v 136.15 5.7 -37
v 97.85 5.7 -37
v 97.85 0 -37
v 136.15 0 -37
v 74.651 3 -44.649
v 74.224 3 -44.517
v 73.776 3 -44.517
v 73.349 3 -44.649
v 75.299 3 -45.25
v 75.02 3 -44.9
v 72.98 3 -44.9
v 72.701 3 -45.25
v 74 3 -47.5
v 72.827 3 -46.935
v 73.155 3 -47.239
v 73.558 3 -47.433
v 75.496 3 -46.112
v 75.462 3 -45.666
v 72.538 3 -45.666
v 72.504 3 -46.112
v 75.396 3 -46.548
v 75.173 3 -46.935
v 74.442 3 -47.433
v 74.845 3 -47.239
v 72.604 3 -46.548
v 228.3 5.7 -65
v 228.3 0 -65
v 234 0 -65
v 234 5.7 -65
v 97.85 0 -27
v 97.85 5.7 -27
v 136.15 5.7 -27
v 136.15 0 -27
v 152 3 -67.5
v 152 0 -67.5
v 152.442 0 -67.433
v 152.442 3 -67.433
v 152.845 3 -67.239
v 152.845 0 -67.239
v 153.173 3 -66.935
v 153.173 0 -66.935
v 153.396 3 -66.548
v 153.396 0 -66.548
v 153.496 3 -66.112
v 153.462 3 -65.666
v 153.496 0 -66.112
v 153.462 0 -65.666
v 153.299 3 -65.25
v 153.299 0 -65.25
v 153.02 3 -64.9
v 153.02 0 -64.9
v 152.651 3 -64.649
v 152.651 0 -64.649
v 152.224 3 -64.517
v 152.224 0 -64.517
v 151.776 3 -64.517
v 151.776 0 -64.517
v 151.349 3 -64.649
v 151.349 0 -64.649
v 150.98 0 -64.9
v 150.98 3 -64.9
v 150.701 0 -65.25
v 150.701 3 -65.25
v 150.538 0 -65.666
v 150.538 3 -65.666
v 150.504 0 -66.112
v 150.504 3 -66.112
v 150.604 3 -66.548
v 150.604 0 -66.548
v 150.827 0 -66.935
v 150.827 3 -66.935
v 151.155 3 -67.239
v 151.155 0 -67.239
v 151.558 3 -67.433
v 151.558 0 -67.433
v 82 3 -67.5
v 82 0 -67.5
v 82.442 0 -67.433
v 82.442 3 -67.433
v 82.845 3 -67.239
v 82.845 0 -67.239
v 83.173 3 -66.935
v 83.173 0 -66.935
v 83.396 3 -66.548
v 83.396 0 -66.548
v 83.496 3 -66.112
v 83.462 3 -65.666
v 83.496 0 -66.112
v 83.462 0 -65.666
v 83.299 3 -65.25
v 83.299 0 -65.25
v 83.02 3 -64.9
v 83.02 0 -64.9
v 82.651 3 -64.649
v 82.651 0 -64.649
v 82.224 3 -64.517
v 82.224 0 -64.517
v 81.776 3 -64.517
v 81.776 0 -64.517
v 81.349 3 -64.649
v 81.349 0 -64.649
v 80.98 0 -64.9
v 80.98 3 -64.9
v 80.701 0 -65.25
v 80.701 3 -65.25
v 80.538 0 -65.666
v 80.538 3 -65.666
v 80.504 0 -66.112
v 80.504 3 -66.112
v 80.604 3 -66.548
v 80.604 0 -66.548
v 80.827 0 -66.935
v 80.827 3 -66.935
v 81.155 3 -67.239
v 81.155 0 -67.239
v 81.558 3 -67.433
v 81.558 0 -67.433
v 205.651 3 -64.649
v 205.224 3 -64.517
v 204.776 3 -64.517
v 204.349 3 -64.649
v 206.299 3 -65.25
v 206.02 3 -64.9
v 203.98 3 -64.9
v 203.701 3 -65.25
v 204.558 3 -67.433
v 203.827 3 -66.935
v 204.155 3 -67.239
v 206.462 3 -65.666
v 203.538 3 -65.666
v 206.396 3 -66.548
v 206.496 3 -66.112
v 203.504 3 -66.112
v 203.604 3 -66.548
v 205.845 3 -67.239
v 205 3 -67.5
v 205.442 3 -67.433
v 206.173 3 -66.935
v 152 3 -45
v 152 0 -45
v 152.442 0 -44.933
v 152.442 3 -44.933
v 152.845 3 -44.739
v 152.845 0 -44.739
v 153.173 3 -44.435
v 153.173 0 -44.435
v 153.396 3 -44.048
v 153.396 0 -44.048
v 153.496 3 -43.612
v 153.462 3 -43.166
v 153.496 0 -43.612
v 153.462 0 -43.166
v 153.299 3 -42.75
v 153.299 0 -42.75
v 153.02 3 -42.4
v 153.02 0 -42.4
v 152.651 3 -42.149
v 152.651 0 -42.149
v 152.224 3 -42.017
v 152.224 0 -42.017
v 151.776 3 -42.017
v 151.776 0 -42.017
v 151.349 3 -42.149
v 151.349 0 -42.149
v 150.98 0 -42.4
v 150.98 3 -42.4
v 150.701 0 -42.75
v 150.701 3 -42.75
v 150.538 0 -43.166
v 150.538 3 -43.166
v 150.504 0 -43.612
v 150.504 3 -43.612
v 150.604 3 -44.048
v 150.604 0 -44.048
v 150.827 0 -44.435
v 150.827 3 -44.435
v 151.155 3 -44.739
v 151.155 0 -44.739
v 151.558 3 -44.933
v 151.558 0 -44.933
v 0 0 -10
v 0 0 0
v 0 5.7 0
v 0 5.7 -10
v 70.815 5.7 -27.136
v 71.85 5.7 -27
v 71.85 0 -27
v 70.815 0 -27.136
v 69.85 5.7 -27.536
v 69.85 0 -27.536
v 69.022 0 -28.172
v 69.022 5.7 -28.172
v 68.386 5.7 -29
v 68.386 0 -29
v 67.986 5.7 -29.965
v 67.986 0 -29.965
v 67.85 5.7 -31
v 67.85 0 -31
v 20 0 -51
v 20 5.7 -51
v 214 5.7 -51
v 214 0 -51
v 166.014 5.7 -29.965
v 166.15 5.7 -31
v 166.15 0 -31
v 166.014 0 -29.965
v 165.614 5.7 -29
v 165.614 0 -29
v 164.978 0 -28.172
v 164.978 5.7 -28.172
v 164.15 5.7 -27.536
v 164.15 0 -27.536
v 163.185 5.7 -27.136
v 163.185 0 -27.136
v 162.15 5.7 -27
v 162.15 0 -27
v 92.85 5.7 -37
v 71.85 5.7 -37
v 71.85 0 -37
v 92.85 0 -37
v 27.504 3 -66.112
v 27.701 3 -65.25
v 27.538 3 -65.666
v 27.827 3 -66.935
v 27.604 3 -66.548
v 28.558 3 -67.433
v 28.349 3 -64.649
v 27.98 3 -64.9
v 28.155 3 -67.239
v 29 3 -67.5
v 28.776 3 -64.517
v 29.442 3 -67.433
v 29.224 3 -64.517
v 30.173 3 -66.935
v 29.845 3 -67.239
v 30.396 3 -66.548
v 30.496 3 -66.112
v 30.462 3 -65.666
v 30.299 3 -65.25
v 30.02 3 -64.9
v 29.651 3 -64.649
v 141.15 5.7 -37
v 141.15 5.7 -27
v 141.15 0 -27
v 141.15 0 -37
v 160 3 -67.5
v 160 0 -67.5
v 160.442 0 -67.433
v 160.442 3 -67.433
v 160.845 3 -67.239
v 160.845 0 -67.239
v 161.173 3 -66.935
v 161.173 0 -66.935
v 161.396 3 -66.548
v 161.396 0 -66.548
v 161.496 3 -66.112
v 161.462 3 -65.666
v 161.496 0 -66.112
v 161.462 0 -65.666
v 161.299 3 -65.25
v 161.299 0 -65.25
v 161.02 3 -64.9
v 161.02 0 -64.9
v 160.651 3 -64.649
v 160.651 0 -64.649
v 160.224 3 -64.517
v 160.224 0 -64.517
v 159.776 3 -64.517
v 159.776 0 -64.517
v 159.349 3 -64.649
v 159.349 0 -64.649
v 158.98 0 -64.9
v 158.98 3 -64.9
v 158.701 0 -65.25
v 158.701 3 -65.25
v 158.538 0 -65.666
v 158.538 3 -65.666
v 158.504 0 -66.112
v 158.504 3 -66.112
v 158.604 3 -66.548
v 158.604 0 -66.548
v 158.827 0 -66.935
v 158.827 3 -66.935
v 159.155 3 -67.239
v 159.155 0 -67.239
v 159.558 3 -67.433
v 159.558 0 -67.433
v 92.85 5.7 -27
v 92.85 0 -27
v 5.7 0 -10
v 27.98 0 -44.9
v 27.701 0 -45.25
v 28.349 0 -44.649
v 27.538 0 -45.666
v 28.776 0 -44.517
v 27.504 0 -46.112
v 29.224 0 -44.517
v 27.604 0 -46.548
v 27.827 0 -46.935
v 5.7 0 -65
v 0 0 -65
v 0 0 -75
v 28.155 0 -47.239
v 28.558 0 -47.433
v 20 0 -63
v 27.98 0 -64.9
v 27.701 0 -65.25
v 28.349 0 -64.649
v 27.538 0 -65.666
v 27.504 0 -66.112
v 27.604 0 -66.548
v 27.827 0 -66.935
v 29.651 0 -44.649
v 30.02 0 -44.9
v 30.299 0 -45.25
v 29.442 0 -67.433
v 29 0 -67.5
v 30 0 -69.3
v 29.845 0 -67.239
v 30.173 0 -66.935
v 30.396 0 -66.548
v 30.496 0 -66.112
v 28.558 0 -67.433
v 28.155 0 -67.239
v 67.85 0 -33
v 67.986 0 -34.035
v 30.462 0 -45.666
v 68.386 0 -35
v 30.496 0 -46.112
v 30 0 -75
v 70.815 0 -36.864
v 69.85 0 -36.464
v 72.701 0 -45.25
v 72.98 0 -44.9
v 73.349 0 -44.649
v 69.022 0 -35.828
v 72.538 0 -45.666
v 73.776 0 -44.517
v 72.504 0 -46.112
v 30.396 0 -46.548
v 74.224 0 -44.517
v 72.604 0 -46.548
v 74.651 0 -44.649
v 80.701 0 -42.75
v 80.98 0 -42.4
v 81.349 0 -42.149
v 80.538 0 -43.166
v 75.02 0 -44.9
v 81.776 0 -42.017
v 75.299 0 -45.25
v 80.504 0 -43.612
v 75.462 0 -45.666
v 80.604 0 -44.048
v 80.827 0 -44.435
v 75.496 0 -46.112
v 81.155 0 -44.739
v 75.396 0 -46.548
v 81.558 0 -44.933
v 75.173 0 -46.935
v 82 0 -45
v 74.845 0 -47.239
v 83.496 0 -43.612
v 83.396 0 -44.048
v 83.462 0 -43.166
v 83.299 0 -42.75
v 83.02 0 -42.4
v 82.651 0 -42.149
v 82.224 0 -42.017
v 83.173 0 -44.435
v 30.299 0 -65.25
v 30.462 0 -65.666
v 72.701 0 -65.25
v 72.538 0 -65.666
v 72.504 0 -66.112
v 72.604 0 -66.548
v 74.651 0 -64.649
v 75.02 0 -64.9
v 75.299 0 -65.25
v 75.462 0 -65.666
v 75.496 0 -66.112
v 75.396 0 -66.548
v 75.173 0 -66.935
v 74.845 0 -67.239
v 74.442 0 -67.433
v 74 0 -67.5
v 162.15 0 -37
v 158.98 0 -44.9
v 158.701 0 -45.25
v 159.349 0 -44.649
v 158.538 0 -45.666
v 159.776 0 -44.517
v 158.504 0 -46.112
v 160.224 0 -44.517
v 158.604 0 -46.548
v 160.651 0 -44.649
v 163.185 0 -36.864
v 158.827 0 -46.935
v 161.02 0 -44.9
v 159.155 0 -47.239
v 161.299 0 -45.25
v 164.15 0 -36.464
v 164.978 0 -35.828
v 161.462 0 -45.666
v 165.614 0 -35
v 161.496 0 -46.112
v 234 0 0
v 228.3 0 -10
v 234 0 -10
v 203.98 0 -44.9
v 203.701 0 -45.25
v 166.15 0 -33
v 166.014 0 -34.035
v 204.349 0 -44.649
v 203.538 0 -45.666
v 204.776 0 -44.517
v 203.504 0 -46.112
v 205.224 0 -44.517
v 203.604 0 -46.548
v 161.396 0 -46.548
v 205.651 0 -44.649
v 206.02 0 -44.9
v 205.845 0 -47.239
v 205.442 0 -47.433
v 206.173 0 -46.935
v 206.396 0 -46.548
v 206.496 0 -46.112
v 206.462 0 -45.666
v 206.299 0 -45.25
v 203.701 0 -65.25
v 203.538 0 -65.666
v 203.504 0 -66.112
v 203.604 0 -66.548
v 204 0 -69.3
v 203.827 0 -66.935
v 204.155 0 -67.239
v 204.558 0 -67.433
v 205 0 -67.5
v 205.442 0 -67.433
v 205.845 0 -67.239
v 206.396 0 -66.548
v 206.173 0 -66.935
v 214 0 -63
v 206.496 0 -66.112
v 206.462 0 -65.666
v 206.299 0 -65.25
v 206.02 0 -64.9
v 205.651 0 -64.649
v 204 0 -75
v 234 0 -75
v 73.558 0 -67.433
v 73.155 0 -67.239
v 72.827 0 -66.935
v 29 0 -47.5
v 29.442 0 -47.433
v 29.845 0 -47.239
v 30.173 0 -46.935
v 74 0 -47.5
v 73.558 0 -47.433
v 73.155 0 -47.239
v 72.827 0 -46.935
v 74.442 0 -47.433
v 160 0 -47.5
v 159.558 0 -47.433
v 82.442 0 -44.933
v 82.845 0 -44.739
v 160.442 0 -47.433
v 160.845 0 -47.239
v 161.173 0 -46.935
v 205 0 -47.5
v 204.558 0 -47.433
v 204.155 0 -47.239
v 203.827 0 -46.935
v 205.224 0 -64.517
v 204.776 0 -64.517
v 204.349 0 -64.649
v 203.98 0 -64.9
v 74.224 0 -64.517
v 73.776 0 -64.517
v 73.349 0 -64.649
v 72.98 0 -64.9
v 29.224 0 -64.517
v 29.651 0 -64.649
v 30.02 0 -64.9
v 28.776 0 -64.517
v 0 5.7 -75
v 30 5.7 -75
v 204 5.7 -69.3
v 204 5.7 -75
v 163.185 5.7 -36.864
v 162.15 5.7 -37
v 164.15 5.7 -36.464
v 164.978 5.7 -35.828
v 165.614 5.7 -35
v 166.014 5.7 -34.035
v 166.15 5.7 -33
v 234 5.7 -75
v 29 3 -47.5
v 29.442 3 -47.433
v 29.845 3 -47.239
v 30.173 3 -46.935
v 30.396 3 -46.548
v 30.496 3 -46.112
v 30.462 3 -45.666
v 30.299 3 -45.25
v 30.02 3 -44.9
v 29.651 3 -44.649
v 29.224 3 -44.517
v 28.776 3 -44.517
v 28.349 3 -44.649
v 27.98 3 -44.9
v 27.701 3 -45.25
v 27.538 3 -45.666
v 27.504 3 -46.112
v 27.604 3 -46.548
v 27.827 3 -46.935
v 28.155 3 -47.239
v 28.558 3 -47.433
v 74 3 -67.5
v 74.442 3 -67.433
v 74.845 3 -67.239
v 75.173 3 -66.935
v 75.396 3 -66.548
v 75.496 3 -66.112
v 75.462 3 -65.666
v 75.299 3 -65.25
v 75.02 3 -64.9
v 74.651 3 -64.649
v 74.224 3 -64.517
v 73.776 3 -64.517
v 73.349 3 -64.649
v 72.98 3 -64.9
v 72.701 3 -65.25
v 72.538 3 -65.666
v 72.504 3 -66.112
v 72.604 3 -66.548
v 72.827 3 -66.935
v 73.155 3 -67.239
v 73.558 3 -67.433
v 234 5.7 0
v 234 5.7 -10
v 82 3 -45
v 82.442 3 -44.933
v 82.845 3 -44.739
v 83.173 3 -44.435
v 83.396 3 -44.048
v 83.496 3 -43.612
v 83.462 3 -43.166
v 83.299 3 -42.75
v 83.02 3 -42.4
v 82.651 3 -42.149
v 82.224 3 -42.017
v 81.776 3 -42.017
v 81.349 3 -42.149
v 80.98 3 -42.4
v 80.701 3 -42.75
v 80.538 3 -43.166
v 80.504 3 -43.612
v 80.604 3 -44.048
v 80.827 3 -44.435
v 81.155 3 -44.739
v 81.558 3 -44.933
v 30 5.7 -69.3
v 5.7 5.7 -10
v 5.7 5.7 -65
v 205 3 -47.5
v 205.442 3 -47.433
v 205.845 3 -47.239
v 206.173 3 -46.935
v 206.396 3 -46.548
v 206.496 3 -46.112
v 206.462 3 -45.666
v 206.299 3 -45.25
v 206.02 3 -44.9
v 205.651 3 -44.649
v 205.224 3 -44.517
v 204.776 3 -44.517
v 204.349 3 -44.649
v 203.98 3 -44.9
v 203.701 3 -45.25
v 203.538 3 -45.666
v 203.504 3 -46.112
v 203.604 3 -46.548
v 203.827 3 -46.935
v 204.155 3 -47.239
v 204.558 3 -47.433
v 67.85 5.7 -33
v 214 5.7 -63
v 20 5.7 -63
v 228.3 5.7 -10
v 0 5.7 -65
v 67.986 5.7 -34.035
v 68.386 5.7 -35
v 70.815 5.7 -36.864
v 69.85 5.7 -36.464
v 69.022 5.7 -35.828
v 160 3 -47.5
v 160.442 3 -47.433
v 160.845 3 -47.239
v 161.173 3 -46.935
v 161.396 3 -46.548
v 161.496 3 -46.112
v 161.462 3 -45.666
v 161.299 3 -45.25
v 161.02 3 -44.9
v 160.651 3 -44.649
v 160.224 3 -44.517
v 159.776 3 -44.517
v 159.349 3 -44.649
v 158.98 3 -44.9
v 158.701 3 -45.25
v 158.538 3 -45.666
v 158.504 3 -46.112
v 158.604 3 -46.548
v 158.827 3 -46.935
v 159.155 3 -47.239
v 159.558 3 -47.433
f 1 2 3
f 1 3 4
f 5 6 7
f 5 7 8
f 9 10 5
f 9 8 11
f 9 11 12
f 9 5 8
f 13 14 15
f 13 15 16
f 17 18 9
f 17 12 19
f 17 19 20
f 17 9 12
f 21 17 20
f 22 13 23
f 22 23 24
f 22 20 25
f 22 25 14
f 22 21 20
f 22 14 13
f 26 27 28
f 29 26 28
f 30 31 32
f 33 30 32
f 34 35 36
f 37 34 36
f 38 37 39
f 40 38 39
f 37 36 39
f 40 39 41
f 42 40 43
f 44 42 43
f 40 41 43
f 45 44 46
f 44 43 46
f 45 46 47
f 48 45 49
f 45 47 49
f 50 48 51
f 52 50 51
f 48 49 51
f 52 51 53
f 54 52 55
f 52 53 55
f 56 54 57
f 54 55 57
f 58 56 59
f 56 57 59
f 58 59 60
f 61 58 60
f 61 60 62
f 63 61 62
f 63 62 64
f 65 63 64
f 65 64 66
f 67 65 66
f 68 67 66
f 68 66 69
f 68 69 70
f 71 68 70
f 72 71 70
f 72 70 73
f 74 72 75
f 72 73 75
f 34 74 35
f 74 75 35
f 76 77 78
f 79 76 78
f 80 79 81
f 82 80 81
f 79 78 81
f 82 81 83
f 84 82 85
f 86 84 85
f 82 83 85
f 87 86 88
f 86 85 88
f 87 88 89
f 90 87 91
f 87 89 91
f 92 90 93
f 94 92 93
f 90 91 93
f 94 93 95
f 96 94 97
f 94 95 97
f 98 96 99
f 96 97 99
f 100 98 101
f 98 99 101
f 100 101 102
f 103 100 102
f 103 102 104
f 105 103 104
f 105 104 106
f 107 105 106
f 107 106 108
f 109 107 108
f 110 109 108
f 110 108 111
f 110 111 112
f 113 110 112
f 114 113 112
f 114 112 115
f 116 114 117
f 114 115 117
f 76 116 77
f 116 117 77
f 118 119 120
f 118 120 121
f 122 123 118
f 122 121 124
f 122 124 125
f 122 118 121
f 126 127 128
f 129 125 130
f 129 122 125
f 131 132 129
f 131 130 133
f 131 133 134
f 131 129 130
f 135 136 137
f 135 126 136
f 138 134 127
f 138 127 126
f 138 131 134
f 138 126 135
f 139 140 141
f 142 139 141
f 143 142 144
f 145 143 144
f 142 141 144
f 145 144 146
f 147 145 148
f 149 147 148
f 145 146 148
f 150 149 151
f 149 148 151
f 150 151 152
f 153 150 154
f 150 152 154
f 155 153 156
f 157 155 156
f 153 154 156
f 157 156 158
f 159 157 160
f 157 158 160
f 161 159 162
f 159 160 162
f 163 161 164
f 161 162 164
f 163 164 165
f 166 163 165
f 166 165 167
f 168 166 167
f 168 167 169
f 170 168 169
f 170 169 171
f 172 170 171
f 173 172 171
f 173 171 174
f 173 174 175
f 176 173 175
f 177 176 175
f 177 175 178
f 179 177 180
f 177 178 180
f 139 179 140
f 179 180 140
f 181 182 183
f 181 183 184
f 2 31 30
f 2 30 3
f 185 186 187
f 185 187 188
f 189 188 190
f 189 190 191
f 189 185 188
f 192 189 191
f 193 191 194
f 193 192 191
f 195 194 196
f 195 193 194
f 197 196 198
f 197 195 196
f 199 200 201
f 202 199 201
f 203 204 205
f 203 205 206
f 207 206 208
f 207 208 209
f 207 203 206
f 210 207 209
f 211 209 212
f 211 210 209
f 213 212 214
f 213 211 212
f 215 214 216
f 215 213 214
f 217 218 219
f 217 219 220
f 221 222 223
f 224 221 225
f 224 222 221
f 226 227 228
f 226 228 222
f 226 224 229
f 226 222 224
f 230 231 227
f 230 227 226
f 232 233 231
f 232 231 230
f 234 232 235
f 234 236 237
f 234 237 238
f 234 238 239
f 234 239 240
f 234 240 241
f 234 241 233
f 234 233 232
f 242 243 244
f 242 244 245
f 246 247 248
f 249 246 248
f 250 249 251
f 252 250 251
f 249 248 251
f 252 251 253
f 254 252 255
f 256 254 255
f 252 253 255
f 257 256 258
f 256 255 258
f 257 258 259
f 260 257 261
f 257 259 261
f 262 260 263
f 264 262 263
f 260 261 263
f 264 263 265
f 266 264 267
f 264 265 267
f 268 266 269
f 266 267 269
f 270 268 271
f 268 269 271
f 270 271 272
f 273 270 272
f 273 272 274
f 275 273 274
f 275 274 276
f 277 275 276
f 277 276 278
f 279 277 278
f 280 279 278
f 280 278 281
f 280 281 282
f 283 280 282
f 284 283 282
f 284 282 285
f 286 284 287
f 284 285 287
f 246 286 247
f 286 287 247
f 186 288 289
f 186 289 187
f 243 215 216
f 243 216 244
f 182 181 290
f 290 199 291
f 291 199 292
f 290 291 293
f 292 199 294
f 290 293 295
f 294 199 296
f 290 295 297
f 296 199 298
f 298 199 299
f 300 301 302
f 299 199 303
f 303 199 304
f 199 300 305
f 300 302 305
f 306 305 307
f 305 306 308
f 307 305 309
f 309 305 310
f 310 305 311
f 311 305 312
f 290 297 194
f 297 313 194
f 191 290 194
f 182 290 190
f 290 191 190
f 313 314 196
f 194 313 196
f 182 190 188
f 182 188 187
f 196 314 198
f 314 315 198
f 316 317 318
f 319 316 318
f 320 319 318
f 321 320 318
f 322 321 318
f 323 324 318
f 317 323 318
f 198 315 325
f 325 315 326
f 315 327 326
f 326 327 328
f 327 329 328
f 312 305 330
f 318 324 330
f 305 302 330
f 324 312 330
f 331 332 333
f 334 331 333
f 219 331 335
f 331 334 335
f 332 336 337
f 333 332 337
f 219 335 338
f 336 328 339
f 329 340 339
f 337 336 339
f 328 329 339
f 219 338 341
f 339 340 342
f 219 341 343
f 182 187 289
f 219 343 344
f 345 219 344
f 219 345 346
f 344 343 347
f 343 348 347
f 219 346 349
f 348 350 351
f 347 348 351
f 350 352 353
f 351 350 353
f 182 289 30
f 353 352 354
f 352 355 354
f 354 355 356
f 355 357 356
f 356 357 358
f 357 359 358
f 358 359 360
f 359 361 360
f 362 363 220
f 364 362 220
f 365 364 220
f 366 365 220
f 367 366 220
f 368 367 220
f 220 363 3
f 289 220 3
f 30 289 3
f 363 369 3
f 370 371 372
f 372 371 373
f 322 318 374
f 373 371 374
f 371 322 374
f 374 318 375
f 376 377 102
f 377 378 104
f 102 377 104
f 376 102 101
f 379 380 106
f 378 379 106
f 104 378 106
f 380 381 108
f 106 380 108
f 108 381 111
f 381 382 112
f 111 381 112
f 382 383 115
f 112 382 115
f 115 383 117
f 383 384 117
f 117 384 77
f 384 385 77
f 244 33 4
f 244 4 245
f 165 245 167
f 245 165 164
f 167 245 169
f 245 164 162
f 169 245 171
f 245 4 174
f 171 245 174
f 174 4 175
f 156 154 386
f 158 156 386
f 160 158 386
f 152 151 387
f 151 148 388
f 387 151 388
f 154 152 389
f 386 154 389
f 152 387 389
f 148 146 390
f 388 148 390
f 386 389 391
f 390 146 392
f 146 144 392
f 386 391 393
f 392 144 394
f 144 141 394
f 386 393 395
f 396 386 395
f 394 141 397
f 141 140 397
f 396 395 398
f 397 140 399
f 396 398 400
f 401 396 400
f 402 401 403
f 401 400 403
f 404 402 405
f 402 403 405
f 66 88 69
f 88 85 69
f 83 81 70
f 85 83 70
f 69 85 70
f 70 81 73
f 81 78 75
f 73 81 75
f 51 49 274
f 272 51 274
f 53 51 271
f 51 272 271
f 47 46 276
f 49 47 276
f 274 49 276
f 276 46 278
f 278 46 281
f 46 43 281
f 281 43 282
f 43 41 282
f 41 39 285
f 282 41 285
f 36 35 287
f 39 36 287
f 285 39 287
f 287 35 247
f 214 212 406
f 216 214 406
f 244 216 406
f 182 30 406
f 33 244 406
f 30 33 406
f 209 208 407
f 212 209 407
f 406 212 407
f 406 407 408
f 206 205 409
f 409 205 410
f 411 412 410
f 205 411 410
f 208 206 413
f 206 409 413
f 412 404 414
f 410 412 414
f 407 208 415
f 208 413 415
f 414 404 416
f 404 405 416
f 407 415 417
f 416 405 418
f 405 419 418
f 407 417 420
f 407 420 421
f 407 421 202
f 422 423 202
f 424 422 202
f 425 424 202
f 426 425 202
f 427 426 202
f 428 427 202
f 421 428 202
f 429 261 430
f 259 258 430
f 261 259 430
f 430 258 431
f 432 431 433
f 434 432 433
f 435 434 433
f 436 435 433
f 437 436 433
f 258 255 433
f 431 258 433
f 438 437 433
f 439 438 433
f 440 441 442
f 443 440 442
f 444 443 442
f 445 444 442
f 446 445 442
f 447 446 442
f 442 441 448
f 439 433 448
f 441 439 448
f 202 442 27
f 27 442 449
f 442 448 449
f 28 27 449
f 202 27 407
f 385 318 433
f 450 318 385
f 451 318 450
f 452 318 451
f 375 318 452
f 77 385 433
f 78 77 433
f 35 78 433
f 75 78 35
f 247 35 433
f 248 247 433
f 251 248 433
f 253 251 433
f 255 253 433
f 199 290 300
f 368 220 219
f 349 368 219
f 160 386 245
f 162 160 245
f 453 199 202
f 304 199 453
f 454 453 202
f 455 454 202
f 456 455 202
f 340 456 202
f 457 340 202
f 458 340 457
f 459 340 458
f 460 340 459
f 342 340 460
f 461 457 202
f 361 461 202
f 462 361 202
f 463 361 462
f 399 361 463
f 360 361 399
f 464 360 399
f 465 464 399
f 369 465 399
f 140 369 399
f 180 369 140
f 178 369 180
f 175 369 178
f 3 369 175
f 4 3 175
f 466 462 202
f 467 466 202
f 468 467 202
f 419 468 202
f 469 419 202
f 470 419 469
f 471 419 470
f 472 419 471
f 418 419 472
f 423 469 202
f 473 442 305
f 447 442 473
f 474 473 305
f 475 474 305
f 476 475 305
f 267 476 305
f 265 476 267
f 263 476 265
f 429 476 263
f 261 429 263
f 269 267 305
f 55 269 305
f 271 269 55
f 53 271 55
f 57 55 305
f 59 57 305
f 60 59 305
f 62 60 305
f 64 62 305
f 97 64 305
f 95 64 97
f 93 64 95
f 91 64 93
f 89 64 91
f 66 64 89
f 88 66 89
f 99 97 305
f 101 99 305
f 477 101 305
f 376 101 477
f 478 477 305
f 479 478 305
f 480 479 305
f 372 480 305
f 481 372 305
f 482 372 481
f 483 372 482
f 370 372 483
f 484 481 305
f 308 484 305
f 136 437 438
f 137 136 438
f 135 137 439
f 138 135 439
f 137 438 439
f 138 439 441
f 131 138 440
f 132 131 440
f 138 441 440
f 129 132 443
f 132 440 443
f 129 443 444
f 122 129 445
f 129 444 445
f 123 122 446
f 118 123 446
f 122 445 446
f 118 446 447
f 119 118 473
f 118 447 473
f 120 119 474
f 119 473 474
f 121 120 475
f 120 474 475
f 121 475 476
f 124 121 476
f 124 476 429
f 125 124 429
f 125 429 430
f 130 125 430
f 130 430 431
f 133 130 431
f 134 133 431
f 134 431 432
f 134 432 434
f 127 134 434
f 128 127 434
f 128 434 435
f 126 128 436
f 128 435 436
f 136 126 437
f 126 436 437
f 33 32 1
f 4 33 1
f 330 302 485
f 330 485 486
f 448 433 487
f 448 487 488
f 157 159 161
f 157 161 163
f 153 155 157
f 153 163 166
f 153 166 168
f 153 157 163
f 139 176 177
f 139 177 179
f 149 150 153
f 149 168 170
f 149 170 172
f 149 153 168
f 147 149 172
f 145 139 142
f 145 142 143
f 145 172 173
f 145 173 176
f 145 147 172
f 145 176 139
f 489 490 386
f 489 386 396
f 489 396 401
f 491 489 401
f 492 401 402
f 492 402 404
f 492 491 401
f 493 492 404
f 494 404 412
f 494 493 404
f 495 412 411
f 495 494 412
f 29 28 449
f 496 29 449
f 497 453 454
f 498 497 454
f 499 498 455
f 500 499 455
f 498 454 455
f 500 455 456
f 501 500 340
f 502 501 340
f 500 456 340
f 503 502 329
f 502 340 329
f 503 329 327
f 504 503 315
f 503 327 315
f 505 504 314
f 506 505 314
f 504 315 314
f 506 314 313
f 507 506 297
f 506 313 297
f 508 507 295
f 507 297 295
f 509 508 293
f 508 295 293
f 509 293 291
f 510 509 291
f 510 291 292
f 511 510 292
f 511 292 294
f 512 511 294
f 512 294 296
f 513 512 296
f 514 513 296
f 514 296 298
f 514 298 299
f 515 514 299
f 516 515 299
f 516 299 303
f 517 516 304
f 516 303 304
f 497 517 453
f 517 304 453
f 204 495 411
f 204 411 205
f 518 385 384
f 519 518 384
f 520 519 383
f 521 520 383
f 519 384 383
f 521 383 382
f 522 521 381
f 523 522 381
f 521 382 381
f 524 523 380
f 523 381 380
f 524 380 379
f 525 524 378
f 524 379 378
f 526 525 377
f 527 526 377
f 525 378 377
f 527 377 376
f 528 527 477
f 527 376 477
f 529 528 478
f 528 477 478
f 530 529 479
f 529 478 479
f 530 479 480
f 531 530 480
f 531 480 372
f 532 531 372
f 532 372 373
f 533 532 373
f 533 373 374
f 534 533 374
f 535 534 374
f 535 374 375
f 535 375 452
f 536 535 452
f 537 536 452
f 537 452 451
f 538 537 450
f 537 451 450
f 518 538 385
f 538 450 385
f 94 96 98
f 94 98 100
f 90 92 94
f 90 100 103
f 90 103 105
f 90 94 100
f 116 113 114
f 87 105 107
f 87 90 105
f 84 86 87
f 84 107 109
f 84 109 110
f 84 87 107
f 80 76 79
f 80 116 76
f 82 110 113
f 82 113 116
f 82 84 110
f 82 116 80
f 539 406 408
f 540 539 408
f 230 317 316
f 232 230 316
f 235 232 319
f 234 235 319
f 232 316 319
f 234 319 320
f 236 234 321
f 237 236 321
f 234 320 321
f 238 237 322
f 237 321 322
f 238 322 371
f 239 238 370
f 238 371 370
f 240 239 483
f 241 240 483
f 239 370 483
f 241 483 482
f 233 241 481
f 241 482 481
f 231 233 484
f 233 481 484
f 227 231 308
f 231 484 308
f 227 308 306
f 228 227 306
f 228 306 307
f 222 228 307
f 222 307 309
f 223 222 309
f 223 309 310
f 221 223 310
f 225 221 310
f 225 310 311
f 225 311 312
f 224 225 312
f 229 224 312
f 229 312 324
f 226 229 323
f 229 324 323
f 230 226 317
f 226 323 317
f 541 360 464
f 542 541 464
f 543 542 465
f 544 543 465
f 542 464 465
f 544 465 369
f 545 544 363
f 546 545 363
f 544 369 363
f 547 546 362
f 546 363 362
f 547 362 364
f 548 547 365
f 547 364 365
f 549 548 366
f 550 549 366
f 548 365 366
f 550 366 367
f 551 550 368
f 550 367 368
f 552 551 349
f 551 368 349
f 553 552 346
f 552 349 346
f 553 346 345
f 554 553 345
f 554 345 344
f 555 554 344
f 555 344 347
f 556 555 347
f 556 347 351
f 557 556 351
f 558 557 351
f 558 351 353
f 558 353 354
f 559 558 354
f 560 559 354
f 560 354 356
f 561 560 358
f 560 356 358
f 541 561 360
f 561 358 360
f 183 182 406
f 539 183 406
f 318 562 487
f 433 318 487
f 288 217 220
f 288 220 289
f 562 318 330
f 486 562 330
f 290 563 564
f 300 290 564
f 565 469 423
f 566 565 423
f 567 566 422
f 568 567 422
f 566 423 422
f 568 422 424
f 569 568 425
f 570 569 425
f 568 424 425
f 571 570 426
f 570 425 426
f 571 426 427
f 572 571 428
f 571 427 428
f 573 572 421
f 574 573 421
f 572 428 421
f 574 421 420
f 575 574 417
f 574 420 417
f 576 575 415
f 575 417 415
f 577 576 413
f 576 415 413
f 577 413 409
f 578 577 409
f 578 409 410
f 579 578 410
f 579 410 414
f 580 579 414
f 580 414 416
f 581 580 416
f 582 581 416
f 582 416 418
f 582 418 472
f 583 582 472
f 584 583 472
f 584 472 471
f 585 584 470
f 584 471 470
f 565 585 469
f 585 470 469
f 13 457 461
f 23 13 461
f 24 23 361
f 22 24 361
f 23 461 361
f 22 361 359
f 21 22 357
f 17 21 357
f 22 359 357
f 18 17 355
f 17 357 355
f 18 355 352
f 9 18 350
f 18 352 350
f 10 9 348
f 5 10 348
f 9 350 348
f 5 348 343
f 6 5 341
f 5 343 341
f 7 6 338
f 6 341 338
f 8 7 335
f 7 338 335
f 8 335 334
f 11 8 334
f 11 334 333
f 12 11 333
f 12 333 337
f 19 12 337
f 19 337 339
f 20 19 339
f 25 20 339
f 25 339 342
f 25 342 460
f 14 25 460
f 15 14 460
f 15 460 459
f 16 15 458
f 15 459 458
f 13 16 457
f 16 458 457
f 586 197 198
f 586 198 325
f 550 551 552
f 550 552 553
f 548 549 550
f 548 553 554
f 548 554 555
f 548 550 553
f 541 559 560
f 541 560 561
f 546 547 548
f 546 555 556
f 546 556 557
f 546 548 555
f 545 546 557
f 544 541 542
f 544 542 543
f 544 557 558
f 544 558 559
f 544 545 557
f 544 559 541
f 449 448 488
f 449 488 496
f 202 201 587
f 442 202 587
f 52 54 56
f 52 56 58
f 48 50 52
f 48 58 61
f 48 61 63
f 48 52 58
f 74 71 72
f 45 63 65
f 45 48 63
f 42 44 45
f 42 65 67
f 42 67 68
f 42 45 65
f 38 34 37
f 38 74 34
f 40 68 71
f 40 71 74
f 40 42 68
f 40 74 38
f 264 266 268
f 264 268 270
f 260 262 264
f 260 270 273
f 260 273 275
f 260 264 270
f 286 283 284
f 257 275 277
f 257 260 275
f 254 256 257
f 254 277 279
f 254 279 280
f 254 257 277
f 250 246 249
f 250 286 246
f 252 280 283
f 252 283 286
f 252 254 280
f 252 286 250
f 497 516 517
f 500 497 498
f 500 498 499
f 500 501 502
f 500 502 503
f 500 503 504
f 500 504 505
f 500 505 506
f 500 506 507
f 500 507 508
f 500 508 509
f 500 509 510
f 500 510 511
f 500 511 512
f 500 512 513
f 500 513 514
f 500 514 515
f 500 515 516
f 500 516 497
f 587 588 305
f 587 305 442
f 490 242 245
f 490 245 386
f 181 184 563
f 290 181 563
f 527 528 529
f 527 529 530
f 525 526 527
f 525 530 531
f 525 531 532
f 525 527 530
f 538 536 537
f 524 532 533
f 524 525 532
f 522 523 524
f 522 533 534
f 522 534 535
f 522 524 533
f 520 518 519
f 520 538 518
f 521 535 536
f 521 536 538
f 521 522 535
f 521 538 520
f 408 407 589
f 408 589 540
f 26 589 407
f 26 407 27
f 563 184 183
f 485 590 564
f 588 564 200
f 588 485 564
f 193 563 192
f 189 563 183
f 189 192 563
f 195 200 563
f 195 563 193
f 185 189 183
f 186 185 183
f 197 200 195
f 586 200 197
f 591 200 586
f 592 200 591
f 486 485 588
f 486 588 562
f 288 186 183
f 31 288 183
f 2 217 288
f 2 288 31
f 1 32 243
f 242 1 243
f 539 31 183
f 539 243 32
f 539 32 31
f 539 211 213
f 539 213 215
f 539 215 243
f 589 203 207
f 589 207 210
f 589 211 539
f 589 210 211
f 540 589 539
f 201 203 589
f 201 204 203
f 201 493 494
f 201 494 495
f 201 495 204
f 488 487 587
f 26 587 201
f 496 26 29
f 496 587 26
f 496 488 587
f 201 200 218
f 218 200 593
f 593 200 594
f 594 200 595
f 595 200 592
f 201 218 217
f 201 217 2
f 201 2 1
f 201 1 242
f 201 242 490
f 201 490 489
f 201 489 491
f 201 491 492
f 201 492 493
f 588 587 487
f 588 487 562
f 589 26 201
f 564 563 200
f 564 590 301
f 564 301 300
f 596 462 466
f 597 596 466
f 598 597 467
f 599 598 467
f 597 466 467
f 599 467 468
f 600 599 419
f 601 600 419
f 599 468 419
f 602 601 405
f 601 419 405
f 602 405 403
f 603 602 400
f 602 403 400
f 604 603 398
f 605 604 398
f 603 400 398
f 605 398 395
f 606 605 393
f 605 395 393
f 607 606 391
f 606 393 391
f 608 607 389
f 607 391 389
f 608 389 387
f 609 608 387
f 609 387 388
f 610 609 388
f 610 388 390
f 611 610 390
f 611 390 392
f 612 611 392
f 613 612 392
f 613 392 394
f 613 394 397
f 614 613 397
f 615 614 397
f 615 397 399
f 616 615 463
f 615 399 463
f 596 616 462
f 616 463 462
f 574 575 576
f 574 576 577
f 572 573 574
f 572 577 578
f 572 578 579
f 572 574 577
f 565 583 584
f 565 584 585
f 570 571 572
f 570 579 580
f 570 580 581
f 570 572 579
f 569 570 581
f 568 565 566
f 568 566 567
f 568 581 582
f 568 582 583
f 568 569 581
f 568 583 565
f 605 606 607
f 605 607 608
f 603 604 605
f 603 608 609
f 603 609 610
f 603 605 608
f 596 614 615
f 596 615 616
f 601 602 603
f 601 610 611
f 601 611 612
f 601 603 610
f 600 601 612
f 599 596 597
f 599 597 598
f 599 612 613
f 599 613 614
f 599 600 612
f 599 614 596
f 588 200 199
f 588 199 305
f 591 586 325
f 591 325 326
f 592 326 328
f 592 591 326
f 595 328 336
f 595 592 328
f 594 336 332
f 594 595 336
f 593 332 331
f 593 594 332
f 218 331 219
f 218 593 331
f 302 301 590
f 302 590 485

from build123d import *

# Parameters (mm, degrees)
SKETCH1_W           = 234
SKETCH1_H           = 75
BOSS_EXTRUDE1_DEPTH = 5.7
SKETCH2_W           = 5.7
SKETCH2_H           = 55
CUT_EXTRUDE1_DEPTH  = 5.7
SKETCH3_W           = 194
SKETCH3_H           = 12
SKETCH3_W_2         = 38.3
SKETCH3_H_2         = 10
CUT_EXTRUDE2_DEPTH  = 5.7
SKETCH4_W           = 174
SKETCH4_H           = 5.7
CUT_EXTRUDE3_DEPTH  = 5.7
SKETCH6_R           = 1.5
CUT_EXTRUDE4_DEPTH  = 3
SKETCH7_R           = 1.5
CUT_EXTRUDE5_DEPTH  = 3


with BuildPart() as part:
    # Sketch1 → Boss-Extrude1 (new body)
    with BuildSketch(Plane(origin=(0, 0, 0), x_dir=(1, 0, 0), z_dir=(0, 1, 0))):
        with Locations((117, 37.5)):
            Rectangle(SKETCH1_W, SKETCH1_H)
    extrude(amount=BOSS_EXTRUDE1_DEPTH)

    # Sketch2 → Cut-Extrude1 (cut)
    with BuildSketch(Plane(origin=(0, 5.7, 0), x_dir=(1, 0, 0), z_dir=(0, 1, 0))):
        with Locations((2.85, 37.5)):
            Rectangle(SKETCH2_W, SKETCH2_H)
        with Locations((231.15, 37.5)):
            Rectangle(SKETCH2_W, SKETCH2_H)
    extrude(amount=-CUT_EXTRUDE1_DEPTH, mode=Mode.SUBTRACT)

    # Sketch3 → Cut-Extrude2 (cut)
    with BuildSketch(Plane(origin=(0, 5.7, 0), x_dir=(1, 0, 0), z_dir=(0, 1, 0))):
        with Locations((117, 57)):
            Rectangle(SKETCH3_W, SKETCH3_H)
        with Locations((117, 32)):
            Rectangle(SKETCH3_W_2, SKETCH3_H_2)
        with BuildLine():
            Line((92.85, 27), (71.85, 27))
            ThreePointArc((71.85, 27), (69.021572875, 28.171572875), (67.85, 31))
            Line((67.85, 31), (67.85, 33))
            ThreePointArc((67.85, 33), (69.021572875, 35.828427125), (71.85, 37))
            Line((71.85, 37), (92.85, 37))
            Line((92.85, 37), (92.85, 27))
        make_face()
        with BuildLine():
            Line((162.15, 27), (141.15, 27))
            Line((141.15, 27), (141.15, 37))
            Line((141.15, 37), (162.15, 37))
            ThreePointArc((162.15, 37), (164.978427125, 35.828427125), (166.15, 33))
            Line((166.15, 33), (166.15, 31))
            ThreePointArc((166.15, 31), (164.978427125, 28.171572875), (162.15, 27))
        make_face()
    extrude(amount=-CUT_EXTRUDE2_DEPTH, mode=Mode.SUBTRACT)

    # Sketch4 → Cut-Extrude3 (cut)
    with BuildSketch(Plane(origin=(0, 5.7, 0), x_dir=(1, 0, 0), z_dir=(0, 1, 0))):
        with Locations((117, 72.15)):
            Rectangle(SKETCH4_W, SKETCH4_H)
    extrude(amount=-CUT_EXTRUDE3_DEPTH, mode=Mode.SUBTRACT)

    # Sketch6 → Cut-Extrude4 (cut)
    with BuildSketch(Plane.XZ):
        with Locations(Location((152, -66, 0), (0, 0, 270))):
            Circle(SKETCH6_R)
        with Locations(Location((82, -66, 0), (0, 0, 270))):
            Circle(SKETCH6_R)
        with Locations(Location((82, -43.5, 0), (0, 0, 270))):
            Circle(SKETCH6_R)
        with Locations(Location((152, -43.5, 0), (0, 0, 270))):
            Circle(SKETCH6_R)
    extrude(amount=-CUT_EXTRUDE4_DEPTH, mode=Mode.SUBTRACT)

    # Sketch7 → Cut-Extrude5 (cut)
    with BuildSketch(Plane.XZ):
        with Locations(Location((205, -66, 0), (0, 0, 270))):
            Circle(SKETCH7_R)
        with Locations(Location((160, -66, 0), (0, 0, 270))):
            Circle(SKETCH7_R)
        with Locations(Location((160, -46, 0), (0, 0, 270))):
            Circle(SKETCH7_R)
        with Locations(Location((205, -46, 0), (0, 0, 270))):
            Circle(SKETCH7_R)
        with Locations(Location((74, -66, 0), (0, 0, 270))):
            Circle(SKETCH7_R)
        with Locations(Location((29, -66, 0), (0, 0, 270))):
            Circle(SKETCH7_R)
        with Locations(Location((29, -46, 0), (0, 0, 270))):
            Circle(SKETCH7_R)
        with Locations(Location((74, -46, 0), (0, 0, 270))):
            Circle(SKETCH7_R)
    extrude(amount=-CUT_EXTRUDE5_DEPTH, mode=Mode.SUBTRACT)


solid = part.part
